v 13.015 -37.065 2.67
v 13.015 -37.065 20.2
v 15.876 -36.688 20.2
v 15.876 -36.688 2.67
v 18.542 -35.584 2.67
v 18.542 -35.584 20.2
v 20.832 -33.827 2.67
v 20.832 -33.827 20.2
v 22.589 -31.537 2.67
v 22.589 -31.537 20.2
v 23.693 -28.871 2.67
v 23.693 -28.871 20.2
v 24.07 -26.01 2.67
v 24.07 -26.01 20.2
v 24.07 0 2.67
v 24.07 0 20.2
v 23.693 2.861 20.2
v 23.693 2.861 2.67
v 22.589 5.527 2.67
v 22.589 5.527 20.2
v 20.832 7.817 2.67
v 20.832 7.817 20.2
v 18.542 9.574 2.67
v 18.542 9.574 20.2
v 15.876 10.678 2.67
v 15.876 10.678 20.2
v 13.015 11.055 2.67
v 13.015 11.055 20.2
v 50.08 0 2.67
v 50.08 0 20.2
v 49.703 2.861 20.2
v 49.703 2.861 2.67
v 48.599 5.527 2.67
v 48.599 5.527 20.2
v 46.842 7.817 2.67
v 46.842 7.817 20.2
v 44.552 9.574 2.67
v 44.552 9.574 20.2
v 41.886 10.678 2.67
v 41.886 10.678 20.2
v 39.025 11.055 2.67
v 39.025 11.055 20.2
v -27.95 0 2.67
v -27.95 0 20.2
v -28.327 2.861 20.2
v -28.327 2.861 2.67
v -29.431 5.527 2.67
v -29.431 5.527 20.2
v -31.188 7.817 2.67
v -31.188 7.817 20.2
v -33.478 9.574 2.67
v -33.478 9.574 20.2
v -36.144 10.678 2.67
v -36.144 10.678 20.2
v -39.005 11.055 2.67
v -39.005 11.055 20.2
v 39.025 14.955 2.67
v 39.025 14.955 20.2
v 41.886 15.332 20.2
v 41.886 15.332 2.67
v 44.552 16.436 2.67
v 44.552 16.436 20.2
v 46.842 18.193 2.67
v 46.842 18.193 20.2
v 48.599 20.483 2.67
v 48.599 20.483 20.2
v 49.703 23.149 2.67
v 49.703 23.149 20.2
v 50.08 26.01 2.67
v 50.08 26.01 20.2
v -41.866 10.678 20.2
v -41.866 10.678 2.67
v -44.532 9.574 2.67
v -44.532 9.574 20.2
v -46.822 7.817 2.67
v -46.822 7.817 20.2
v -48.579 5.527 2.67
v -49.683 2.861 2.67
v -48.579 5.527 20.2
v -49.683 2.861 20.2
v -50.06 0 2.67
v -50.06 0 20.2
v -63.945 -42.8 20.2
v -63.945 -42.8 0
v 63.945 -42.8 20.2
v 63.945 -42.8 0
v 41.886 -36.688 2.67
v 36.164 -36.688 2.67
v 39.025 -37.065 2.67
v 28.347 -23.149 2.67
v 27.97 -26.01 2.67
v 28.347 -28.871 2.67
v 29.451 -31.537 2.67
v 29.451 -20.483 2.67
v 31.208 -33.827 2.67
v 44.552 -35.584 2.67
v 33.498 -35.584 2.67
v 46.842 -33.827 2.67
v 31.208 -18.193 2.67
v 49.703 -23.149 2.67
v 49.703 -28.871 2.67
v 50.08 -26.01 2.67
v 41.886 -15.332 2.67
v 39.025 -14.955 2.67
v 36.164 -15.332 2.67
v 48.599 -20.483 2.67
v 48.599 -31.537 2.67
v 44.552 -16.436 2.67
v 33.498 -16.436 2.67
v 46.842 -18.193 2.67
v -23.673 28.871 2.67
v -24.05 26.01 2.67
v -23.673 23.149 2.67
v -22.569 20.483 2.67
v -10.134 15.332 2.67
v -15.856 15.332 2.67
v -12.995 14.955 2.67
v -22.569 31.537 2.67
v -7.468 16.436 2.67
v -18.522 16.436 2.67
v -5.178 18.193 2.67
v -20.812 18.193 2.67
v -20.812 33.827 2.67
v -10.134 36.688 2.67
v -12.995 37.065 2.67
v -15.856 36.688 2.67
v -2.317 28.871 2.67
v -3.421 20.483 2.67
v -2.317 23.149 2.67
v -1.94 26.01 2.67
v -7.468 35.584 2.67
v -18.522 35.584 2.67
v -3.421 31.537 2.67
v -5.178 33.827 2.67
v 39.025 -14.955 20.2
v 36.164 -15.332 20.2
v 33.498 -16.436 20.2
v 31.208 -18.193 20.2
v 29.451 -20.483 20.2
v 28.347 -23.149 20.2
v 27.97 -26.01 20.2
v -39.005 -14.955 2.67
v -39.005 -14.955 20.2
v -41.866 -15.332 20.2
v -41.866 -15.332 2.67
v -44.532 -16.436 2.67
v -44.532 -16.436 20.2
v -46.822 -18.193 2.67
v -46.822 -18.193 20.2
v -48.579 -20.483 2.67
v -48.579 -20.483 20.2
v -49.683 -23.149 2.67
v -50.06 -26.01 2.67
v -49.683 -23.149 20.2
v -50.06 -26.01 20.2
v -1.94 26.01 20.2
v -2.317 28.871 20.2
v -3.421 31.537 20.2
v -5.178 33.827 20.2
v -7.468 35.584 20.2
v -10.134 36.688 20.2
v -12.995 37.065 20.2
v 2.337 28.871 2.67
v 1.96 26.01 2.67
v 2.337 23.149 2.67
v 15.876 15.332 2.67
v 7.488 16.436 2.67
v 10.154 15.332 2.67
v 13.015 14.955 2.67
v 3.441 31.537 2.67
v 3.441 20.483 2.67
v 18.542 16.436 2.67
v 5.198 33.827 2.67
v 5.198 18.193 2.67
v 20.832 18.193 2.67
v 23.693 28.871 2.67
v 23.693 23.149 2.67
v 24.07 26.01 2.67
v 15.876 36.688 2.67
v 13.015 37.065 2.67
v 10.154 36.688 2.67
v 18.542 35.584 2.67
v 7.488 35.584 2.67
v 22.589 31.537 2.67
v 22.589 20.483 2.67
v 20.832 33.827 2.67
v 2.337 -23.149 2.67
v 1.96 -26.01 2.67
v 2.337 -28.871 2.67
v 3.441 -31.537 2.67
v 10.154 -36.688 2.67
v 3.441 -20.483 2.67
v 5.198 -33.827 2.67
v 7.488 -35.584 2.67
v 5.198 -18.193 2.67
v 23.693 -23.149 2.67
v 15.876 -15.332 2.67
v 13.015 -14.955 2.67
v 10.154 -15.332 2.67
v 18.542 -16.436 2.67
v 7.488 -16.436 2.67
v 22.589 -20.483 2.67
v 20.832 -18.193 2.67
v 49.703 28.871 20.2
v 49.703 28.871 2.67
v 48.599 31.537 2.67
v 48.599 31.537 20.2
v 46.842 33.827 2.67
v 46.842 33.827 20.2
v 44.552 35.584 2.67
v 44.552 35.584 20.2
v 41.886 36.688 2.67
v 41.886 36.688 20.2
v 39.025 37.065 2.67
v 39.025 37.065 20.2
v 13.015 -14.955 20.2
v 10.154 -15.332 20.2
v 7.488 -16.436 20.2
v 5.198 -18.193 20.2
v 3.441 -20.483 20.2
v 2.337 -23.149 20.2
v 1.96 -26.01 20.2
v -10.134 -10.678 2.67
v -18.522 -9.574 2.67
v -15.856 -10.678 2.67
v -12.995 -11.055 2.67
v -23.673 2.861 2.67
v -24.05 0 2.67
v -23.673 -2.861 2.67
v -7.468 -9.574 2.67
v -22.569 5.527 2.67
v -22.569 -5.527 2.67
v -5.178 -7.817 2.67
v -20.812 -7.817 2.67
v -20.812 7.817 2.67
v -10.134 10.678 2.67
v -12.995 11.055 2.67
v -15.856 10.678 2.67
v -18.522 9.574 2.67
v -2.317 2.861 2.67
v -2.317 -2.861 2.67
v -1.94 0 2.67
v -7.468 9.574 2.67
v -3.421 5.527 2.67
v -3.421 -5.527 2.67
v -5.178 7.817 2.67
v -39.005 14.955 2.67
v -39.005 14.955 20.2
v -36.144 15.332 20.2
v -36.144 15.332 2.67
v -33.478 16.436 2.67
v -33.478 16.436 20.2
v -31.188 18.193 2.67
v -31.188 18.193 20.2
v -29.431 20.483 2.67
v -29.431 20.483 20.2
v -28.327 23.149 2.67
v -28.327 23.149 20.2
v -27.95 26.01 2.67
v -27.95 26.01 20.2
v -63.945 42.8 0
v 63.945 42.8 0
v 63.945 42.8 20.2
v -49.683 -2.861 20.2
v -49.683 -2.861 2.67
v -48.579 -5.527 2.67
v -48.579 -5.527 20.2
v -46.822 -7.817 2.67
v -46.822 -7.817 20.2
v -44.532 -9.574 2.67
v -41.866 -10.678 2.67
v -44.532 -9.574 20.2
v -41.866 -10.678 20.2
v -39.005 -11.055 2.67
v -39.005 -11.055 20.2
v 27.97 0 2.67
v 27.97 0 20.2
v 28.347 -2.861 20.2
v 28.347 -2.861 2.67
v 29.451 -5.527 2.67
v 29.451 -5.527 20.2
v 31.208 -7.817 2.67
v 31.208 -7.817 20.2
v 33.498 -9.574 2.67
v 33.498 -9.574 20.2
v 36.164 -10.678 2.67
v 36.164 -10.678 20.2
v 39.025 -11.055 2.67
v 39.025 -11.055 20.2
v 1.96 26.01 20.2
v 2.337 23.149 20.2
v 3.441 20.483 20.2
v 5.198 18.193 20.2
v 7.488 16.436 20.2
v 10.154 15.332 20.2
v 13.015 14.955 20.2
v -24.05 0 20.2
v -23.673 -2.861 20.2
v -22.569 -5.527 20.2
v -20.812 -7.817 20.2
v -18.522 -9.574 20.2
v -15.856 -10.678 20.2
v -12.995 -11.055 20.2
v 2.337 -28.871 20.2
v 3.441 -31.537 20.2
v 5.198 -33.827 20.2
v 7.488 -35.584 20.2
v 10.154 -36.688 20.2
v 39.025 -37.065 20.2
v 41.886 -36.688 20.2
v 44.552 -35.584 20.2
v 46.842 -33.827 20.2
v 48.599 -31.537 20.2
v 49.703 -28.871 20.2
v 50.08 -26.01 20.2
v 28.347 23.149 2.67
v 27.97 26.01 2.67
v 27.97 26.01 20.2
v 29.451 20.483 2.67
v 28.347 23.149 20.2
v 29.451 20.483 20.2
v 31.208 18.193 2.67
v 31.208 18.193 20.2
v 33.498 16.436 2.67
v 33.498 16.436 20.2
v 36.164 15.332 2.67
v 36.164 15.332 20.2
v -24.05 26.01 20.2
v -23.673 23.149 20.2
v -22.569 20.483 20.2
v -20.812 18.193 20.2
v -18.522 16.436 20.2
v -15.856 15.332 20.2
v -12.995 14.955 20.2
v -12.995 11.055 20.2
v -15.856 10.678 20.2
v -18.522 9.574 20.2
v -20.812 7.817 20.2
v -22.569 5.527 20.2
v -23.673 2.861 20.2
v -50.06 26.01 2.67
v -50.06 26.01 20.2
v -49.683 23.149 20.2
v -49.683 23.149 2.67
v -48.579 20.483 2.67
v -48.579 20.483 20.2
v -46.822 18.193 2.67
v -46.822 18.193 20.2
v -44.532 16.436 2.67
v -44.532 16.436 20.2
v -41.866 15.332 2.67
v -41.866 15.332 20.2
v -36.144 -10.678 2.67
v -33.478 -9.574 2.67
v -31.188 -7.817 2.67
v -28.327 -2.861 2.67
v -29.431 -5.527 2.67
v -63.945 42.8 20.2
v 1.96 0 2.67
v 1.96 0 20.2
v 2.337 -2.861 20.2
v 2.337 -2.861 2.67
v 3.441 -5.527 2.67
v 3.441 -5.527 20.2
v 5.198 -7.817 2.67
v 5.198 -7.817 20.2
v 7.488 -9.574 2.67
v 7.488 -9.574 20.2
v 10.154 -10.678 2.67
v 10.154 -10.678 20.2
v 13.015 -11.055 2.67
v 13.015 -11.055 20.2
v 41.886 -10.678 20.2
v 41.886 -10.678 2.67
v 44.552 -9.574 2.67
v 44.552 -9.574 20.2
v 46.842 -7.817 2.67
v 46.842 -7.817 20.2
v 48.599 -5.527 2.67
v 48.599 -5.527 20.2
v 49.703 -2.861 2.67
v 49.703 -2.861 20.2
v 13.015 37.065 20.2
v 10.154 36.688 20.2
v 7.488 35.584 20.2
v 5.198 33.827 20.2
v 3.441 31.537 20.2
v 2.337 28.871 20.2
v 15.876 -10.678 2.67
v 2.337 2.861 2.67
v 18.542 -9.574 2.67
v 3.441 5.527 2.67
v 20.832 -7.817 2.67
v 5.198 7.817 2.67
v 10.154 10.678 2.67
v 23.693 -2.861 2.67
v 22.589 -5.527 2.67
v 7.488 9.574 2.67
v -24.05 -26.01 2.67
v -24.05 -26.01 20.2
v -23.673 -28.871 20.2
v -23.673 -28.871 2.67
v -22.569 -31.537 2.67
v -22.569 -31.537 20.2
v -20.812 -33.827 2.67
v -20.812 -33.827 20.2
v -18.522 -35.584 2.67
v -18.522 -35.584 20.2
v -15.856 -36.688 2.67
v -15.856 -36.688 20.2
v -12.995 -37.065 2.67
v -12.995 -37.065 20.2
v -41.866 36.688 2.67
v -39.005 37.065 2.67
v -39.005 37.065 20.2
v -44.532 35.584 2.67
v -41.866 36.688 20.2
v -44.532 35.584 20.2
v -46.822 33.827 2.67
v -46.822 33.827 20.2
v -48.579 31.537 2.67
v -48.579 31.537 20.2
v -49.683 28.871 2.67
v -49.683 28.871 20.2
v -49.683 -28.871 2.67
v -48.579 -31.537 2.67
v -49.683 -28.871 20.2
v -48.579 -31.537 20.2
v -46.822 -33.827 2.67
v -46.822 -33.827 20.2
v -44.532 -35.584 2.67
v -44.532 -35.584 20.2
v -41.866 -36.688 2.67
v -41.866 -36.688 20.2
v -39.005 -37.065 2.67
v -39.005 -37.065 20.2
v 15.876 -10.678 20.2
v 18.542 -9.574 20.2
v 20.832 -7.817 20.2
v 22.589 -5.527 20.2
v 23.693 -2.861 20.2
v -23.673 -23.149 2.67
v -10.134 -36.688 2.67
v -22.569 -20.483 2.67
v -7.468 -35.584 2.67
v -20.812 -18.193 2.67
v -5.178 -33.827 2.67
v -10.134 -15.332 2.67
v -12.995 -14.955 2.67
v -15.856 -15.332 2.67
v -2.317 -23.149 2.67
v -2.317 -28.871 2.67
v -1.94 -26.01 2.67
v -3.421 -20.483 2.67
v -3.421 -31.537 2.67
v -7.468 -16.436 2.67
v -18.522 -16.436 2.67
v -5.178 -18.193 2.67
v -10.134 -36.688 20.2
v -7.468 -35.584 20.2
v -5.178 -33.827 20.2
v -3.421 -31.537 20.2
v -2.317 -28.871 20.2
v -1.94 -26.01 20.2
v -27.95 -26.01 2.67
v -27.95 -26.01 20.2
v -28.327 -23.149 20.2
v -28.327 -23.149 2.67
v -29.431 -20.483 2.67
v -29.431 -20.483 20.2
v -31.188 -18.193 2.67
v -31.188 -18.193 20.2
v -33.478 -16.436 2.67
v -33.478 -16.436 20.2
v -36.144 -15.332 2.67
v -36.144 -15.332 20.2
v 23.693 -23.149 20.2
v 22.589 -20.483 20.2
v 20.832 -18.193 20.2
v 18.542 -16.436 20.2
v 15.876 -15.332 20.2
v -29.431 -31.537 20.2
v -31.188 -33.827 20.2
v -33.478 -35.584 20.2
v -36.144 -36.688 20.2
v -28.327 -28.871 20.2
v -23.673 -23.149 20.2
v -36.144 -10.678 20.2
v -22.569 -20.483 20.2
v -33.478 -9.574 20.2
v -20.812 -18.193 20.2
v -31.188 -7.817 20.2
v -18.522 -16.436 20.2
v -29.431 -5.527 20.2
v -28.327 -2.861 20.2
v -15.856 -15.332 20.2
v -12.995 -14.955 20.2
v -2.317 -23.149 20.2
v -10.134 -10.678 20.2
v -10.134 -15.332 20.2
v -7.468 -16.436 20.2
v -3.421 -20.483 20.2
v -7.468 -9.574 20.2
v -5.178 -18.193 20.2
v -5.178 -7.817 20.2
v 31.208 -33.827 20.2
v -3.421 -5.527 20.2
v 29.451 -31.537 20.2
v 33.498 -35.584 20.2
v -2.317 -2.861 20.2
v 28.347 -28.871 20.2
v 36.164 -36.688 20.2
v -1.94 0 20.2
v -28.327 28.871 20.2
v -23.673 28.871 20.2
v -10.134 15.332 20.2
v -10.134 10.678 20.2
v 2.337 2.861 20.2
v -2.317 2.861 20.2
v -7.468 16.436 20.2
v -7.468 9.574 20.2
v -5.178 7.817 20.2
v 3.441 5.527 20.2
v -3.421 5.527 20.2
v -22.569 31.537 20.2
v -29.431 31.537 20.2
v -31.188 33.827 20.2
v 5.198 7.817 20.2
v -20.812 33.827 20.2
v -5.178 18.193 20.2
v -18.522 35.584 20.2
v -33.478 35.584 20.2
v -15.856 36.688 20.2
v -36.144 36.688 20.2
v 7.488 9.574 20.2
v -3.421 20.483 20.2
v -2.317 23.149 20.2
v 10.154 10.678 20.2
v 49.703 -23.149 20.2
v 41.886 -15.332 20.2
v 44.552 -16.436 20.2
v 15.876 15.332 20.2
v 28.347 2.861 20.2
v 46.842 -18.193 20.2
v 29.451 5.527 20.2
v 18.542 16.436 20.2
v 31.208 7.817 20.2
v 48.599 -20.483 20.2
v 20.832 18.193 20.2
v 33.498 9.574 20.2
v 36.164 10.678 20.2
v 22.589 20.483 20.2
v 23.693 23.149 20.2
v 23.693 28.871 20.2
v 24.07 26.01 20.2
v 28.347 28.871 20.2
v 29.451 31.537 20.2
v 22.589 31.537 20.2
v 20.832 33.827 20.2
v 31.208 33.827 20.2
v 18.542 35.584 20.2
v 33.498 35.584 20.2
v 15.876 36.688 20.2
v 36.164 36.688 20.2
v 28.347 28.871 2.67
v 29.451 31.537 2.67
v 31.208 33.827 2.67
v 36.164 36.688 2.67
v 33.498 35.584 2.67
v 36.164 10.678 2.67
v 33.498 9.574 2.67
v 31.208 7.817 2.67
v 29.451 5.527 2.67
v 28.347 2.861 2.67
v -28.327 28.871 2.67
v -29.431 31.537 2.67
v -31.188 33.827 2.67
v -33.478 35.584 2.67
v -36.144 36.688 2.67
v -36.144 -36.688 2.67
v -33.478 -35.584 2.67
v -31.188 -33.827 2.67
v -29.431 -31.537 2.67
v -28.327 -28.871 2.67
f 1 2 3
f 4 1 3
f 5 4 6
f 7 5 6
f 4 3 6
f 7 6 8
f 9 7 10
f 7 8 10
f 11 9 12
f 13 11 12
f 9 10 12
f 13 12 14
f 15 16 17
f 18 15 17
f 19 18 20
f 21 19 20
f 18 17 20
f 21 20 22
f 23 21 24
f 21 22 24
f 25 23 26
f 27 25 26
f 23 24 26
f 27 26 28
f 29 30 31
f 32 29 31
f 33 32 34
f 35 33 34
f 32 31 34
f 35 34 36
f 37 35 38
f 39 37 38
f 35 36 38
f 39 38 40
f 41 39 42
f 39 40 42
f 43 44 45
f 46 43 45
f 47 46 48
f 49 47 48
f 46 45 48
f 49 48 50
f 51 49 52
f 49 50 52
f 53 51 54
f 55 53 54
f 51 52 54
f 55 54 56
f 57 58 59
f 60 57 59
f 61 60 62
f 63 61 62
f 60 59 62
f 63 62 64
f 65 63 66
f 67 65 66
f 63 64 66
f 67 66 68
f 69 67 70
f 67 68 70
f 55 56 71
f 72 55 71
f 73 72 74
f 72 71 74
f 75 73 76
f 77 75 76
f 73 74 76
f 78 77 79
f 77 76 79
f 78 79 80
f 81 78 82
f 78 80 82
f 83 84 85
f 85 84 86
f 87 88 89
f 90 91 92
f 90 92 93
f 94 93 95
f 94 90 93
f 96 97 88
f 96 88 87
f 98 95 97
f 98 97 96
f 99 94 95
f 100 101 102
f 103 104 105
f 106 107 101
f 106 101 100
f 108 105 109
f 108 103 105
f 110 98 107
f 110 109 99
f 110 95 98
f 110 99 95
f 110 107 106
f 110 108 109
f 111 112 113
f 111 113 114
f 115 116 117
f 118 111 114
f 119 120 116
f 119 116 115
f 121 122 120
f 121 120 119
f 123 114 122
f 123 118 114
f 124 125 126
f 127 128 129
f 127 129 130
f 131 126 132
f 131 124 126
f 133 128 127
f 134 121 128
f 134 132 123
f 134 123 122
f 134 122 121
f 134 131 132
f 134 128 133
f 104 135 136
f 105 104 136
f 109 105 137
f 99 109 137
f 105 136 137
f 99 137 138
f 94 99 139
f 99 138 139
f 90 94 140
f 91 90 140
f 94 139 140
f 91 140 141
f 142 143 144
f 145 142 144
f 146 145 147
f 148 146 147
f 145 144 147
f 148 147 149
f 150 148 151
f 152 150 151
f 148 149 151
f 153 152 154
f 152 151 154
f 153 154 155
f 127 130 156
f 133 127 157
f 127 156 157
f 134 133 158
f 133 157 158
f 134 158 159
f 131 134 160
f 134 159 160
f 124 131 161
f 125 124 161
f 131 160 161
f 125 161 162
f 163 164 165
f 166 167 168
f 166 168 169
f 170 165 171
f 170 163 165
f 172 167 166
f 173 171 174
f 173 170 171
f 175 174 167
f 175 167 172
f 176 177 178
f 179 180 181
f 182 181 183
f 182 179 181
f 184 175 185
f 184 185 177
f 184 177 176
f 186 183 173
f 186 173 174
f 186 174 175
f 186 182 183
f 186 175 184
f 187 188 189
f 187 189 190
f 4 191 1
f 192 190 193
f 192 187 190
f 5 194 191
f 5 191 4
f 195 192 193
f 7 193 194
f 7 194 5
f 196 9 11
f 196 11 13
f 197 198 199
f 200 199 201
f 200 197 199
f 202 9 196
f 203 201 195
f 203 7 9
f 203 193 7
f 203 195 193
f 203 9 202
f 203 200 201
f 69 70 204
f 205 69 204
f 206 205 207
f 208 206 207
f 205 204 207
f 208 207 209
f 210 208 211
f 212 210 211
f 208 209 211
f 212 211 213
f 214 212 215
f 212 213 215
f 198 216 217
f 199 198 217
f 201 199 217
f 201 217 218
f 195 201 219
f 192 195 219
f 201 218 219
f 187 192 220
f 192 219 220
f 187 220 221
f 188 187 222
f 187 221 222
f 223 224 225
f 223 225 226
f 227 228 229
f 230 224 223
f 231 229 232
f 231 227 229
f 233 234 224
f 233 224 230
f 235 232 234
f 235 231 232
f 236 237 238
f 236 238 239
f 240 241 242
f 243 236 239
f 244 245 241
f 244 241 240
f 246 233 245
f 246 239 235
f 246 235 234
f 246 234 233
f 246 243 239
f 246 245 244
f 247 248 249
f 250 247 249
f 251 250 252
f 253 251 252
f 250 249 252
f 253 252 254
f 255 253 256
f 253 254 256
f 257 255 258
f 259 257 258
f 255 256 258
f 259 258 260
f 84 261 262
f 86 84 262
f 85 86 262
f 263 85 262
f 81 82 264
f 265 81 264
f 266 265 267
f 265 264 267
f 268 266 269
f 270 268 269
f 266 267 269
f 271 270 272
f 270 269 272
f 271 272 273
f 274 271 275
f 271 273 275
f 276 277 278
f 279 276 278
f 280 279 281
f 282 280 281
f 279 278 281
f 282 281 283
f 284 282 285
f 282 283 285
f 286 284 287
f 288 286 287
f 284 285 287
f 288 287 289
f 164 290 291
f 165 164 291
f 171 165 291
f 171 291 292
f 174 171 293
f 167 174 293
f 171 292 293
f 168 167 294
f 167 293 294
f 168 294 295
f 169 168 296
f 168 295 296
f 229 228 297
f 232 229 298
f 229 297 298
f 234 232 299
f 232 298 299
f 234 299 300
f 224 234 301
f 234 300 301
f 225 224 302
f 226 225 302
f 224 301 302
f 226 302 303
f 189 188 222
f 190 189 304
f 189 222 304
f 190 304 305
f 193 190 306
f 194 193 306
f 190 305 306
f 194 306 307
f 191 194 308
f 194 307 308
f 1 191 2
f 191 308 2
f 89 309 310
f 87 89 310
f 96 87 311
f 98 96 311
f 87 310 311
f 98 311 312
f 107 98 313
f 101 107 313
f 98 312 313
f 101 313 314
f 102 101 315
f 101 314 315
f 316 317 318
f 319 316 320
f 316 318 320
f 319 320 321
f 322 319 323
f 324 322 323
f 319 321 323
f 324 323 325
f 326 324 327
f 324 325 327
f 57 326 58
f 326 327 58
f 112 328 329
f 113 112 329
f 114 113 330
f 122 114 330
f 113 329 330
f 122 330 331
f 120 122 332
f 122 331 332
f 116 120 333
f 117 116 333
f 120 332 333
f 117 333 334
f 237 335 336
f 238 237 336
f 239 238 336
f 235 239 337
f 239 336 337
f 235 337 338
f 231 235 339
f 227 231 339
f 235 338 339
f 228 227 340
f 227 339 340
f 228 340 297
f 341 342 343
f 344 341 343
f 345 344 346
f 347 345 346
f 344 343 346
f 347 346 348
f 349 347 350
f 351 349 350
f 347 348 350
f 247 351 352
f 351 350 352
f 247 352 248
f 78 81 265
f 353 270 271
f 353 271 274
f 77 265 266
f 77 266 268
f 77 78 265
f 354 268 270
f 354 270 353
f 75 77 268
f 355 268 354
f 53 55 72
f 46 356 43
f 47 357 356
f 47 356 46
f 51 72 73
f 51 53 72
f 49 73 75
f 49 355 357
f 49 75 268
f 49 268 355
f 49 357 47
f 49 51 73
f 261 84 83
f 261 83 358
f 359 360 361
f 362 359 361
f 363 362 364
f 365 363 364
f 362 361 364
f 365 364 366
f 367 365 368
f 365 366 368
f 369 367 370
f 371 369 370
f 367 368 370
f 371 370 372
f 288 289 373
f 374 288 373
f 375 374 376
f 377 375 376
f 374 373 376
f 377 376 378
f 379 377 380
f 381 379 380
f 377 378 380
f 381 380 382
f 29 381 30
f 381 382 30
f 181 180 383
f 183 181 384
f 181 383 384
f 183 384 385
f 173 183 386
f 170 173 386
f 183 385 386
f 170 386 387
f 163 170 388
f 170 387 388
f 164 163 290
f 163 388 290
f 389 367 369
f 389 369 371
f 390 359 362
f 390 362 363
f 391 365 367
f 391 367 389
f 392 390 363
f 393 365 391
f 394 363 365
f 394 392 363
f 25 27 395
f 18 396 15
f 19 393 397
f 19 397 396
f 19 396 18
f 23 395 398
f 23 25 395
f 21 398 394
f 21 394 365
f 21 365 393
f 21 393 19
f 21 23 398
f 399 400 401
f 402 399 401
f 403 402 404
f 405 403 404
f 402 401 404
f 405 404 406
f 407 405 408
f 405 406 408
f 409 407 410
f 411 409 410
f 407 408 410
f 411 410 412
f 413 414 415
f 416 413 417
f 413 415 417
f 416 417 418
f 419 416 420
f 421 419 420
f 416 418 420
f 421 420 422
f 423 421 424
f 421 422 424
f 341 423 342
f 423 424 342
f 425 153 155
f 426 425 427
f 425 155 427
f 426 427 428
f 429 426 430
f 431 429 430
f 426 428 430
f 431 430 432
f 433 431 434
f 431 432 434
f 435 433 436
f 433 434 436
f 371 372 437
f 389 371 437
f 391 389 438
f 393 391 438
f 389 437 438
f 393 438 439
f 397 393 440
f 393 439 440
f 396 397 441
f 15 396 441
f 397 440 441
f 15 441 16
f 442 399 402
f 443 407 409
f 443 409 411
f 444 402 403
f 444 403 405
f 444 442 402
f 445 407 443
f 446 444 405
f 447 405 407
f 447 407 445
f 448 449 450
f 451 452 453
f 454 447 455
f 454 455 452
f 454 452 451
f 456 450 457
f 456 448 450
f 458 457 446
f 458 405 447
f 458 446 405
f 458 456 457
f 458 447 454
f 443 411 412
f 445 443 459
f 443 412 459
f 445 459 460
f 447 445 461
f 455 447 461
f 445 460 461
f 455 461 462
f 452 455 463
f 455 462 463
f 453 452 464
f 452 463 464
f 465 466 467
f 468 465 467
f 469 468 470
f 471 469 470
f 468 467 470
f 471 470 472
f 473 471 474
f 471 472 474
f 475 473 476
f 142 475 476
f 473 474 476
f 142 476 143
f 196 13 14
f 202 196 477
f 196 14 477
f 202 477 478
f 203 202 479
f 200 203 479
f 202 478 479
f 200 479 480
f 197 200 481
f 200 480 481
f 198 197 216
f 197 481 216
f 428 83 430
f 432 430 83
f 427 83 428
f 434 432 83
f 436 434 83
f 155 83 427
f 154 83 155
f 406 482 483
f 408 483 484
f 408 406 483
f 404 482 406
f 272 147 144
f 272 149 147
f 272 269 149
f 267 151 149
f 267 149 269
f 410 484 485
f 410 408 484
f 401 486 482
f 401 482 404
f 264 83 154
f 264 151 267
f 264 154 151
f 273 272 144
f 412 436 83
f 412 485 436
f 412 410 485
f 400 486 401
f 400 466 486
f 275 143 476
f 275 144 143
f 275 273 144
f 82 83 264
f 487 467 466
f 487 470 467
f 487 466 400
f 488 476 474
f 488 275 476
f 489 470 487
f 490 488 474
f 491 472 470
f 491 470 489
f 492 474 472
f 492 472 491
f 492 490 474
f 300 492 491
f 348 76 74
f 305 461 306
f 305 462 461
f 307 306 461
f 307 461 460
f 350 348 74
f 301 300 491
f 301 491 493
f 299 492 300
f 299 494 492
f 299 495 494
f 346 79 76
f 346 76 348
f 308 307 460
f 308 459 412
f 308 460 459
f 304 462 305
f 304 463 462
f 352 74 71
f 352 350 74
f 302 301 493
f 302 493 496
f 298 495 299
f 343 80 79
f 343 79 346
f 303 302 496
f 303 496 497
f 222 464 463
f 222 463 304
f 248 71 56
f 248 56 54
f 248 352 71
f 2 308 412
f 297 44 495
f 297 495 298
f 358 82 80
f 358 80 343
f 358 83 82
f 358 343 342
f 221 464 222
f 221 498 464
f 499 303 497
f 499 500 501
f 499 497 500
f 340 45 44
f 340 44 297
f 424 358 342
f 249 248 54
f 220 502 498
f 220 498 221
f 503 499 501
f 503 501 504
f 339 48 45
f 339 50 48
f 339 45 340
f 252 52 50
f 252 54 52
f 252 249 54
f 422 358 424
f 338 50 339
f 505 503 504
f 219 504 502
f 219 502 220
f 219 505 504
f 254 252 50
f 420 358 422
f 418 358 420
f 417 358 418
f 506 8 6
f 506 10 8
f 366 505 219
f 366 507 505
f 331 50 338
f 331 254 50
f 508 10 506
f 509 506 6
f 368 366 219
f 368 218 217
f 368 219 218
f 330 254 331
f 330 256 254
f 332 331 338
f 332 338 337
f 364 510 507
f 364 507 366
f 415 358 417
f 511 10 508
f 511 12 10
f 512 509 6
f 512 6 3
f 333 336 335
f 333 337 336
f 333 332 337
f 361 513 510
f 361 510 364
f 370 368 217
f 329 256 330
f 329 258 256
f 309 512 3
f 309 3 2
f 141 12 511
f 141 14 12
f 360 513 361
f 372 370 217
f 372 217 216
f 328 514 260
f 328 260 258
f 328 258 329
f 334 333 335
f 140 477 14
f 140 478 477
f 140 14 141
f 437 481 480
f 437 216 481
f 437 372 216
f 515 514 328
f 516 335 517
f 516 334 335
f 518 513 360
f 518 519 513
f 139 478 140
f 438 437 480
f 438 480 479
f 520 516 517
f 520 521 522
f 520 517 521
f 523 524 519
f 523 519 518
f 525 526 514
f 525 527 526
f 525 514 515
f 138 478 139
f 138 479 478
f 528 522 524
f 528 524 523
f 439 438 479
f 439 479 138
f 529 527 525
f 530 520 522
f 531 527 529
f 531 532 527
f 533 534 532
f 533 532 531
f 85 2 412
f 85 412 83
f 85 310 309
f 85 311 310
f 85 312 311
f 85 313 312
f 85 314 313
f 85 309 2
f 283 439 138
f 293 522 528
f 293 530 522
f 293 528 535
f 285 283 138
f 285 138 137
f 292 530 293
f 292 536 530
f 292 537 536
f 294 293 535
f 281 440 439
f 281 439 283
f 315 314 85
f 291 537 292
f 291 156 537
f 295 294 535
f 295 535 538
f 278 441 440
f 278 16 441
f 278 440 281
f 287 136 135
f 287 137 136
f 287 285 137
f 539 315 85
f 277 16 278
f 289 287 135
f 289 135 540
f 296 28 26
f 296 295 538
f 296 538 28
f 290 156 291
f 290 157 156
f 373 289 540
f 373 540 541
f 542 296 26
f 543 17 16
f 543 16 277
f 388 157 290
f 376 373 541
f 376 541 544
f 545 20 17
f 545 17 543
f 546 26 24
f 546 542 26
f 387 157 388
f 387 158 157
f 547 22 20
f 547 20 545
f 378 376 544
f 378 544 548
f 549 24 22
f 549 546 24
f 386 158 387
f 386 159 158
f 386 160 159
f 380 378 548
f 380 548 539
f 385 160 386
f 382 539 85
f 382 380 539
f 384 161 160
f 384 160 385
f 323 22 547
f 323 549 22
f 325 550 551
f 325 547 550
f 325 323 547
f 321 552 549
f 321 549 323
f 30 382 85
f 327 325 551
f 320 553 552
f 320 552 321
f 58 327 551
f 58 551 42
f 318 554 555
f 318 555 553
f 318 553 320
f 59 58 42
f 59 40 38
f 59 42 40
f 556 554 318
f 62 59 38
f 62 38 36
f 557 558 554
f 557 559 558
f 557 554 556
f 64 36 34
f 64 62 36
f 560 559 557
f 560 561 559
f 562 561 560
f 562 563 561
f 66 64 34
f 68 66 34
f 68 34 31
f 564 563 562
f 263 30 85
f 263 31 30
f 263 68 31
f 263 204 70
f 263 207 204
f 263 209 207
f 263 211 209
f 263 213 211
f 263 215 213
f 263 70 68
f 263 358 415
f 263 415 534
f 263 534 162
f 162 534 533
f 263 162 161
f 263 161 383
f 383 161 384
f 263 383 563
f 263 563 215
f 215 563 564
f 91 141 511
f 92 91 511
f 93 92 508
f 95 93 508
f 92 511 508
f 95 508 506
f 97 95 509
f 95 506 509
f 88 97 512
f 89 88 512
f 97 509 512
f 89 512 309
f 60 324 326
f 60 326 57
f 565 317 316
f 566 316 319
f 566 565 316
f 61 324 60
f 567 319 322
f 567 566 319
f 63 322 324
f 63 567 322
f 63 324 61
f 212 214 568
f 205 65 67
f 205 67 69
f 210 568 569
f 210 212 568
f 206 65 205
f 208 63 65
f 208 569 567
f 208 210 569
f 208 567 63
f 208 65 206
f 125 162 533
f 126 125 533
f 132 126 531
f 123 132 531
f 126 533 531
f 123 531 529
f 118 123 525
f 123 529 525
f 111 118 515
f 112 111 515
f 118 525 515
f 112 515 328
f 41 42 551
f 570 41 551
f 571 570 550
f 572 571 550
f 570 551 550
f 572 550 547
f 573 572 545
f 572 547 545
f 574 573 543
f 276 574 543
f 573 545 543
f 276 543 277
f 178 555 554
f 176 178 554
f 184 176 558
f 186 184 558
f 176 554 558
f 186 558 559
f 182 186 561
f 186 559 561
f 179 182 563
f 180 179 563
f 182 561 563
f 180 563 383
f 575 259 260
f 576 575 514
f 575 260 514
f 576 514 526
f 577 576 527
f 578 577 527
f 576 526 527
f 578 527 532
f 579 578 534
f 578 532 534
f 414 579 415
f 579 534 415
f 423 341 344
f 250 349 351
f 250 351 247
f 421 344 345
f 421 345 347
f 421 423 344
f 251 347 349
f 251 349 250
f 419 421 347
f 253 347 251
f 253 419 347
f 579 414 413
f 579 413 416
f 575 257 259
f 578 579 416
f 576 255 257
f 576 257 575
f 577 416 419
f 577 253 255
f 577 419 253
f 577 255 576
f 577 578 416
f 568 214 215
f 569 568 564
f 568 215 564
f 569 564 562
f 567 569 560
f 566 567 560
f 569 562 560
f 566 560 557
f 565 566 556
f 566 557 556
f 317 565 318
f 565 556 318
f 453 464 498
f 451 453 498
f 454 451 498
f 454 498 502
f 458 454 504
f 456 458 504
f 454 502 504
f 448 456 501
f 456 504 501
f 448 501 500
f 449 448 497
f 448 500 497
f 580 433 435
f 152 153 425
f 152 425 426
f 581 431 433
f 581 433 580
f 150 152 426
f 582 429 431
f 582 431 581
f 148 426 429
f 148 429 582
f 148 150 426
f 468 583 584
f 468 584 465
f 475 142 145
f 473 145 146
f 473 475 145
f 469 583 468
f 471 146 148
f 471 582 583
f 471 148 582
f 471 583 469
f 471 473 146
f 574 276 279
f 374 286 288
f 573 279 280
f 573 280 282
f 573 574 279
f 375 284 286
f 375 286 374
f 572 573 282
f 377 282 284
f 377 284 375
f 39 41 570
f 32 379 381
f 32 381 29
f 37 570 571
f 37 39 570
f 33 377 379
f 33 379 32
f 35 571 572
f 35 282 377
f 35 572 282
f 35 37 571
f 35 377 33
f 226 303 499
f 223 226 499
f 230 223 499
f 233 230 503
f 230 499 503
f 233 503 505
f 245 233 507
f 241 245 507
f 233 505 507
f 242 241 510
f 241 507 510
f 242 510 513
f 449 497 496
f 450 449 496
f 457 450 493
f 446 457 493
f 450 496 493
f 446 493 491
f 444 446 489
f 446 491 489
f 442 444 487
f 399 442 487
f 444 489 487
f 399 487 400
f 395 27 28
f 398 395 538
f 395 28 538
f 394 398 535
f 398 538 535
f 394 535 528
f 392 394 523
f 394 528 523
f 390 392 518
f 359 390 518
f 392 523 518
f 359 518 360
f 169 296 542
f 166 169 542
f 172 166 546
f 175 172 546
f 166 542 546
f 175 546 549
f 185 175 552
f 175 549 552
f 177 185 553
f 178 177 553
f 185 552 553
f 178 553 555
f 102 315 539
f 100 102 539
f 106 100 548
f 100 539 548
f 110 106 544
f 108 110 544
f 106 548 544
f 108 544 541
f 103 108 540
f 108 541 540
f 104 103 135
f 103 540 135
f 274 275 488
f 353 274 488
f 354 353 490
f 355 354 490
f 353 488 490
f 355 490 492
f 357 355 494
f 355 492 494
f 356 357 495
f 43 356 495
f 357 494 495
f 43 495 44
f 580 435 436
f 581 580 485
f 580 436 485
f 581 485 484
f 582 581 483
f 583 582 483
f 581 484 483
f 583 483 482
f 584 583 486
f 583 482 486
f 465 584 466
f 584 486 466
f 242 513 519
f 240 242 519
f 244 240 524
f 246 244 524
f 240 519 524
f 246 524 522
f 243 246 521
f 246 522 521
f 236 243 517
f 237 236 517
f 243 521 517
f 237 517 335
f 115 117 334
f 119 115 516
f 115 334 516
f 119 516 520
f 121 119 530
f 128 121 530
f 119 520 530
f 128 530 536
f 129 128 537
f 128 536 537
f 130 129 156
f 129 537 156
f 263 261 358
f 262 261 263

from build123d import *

# Parameters (mm, degrees)
F0_W     = 127.89
F0_H     = 85.6
F1_DEPTH = 20.2
F3_DEPTH = 17.53


with BuildPart() as f1:
    # F0 (on Top) → F1 (new body)
    with BuildSketch(Plane.XY):
        Rectangle(F0_W, F0_H)
    extrude(amount=F1_DEPTH)

    # F2 (on face) → F3 (cut)
    with BuildSketch(Plane.XY.offset(20.2)):
        with BuildLine():
            Line((-39.005, 26.01), (-39.005, 37.065))
            ThreePointArc((-39.005, 37.065), (-46.822065466, 33.827065466), (-50.06, 26.01))
            Line((-50.06, 26.01), (-39.005, 26.01))
        make_face()
        with BuildLine():
            ThreePointArc((-27.95, 26.01), (-31.187934534, 33.827065466), (-39.005, 37.065))
            Line((-39.005, 37.065), (-39.005, 26.01))
            Line((-39.005, 26.01), (-27.95, 26.01))
        make_face()
        with BuildLine():
            Line((-27.95, 26.01), (-39.005, 26.01))
            Line((-39.005, 26.01), (-39.005, 14.955))
            ThreePointArc((-39.005, 14.955), (-31.187934534, 18.192934534), (-27.95, 26.01))
        make_face()
        with BuildLine():
            Line((-39.005, 14.955), (-39.005, 26.01))
            Line((-39.005, 26.01), (-50.06, 26.01))
            ThreePointArc((-50.06, 26.01), (-46.822065466, 18.192934534), (-39.005, 14.955))
        make_face()
        with BuildLine():
            ThreePointArc((-39.005, 11.055), (-46.822065466, 7.817065466), (-50.06, 0))
            Line((-50.06, 0), (-39.005, 0))
            Line((-39.005, 0), (-39.005, 11.055))
        make_face()
        with BuildLine():
            ThreePointArc((-27.95, 0), (-31.187934534, 7.817065466), (-39.005, 11.055))
            Line((-39.005, 11.055), (-39.005, 0))
            Line((-39.005, 0), (-27.95, 0))
        make_face()
        with BuildLine():
            Line((-39.005, 0), (-50.06, 0))
            ThreePointArc((-50.06, 0), (-46.822065466, -7.817065466), (-39.005, -11.055))
            Line((-39.005, -11.055), (-39.005, 0))
        make_face()
        with BuildLine():
            Line((-27.95, 0), (-39.005, 0))
            Line((-39.005, 0), (-39.005, -11.055))
            ThreePointArc((-39.005, -11.055), (-31.187934534, -7.817065466), (-27.95, 0))
        make_face()
        with BuildLine():
            Line((-39.005, -14.955), (-39.005, -26.01))
            Line((-39.005, -26.01), (-27.95, -26.01))
            ThreePointArc((-27.95, -26.01), (-31.187934534, -18.192934534), (-39.005, -14.955))
        make_face()
        with BuildLine():
            ThreePointArc((-39.005, -14.955), (-46.822065466, -18.192934534), (-50.06, -26.01))
            Line((-50.06, -26.01), (-39.005, -26.01))
            Line((-39.005, -26.01), (-39.005, -14.955))
        make_face()
        with BuildLine():
            Line((-39.005, -26.01), (-50.06, -26.01))
            ThreePointArc((-50.06, -26.01), (-46.822065466, -33.827065466), (-39.005, -37.065))
            Line((-39.005, -37.065), (-39.005, -26.01))
        make_face()
        with BuildLine():
            Line((-39.005, -26.01), (-39.005, -37.065))
            ThreePointArc((-39.005, -37.065), (-31.187934534, -33.827065466), (-27.95, -26.01))
            Line((-27.95, -26.01), (-39.005, -26.01))
        make_face()
        with BuildLine():
            ThreePointArc((-24.05, -26.01), (-20.812065466, -33.827065466), (-12.995, -37.065))
            Line((-12.995, -37.065), (-12.995, -26.01))
            Line((-12.995, -26.01), (-24.05, -26.01))
        make_face()
        with BuildLine():
            Line((-12.995, -26.01), (-12.995, -37.065))
            ThreePointArc((-12.995, -37.065), (-5.177934534, -33.827065466), (-1.94, -26.01))
            Line((-1.94, -26.01), (-12.995, -26.01))
        make_face()
        with BuildLine():
            Line((-12.995, -14.955), (-12.995, -26.01))
            Line((-12.995, -26.01), (-1.94, -26.01))
            ThreePointArc((-1.94, -26.01), (-5.177934534, -18.192934534), (-12.995, -14.955))
        make_face()
        with BuildLine():
            Line((-24.05, -26.01), (-12.995, -26.01))
            Line((-12.995, -26.01), (-12.995, -14.955))
            ThreePointArc((-12.995, -14.955), (-20.812065466, -18.192934534), (-24.05, -26.01))
        make_face()
        with BuildLine():
            Line((-12.995, -11.055), (-12.995, 0))
            Line((-12.995, 0), (-24.05, 0))
            ThreePointArc((-24.05, 0), (-20.812065466, -7.817065466), (-12.995, -11.055))
        make_face()
        with BuildLine():
            Line((-1.94, 0), (-12.995, 0))
            Line((-12.995, 0), (-12.995, -11.055))
            ThreePointArc((-12.995, -11.055), (-5.177934534, -7.817065466), (-1.94, 0))
        make_face()
        with BuildLine():
            ThreePointArc((-1.94, 0), (-5.177934534, 7.817065466), (-12.995, 11.055))
            Line((-12.995, 11.055), (-12.995, 0))
            Line((-12.995, 0), (-1.94, 0))
        make_face()
        with BuildLine():
            Line((-12.995, 0), (-12.995, 11.055))
            ThreePointArc((-12.995, 11.055), (-20.812065466, 7.817065466), (-24.05, 0))
            Line((-24.05, 0), (-12.995, 0))
        make_face()
        with BuildLine():
            Line((-12.995, 14.955), (-12.995, 26.01))
            Line((-12.995, 26.01), (-24.05, 26.01))
            ThreePointArc((-24.05, 26.01), (-20.812065466, 18.192934534), (-12.995, 14.955))
        make_face()
        with BuildLine():
            Line((-1.94, 26.01), (-12.995, 26.01))
            Line((-12.995, 26.01), (-12.995, 14.955))
            ThreePointArc((-12.995, 14.955), (-5.177934534, 18.192934534), (-1.94, 26.01))
        make_face()
        with BuildLine():
            ThreePointArc((-1.94, 26.01), (-5.177934534, 33.827065466), (-12.995, 37.065))
            Line((-12.995, 37.065), (-12.995, 26.01))
            Line((-12.995, 26.01), (-1.94, 26.01))
        make_face()
        with BuildLine():
            Line((-12.995, 26.01), (-12.995, 37.065))
            ThreePointArc((-12.995, 37.065), (-20.812065466, 33.827065466), (-24.05, 26.01))
            Line((-24.05, 26.01), (-12.995, 26.01))
        make_face()
        with BuildLine():
            Line((13.015, 26.01), (13.015, 37.065))
            ThreePointArc((13.015, 37.065), (5.197934534, 33.827065466), (1.96, 26.01))
            Line((1.96, 26.01), (13.015, 26.01))
        make_face()
        with BuildLine():
            ThreePointArc((24.07, 26.01), (20.832065466, 33.827065466), (13.015, 37.065))
            Line((13.015, 37.065), (13.015, 26.01))
            Line((13.015, 26.01), (24.07, 26.01))
        make_face()
        with BuildLine():
            Line((24.07, 26.01), (13.015, 26.01))
            Line((13.015, 26.01), (13.015, 14.955))
            ThreePointArc((13.015, 14.955), (20.832065466, 18.192934534), (24.07, 26.01))
        make_face()
        with BuildLine():
            Line((13.015, 14.955), (13.015, 26.01))
            Line((13.015, 26.01), (1.96, 26.01))
            ThreePointArc((1.96, 26.01), (5.197934534, 18.192934534), (13.015, 14.955))
        make_face()
        with BuildLine():
            Line((13.015, 0), (13.015, 11.055))
            ThreePointArc((13.015, 11.055), (5.197934534, 7.817065466), (1.96, 0))
            Line((1.96, 0), (13.015, 0))
        make_face()
        with BuildLine():
            ThreePointArc((24.07, 0), (20.832065466, 7.817065466), (13.015, 11.055))
            Line((13.015, 11.055), (13.015, 0))
            Line((13.015, 0), (24.07, 0))
        make_face()
        with BuildLine():
            Line((13.015, -11.055), (13.015, 0))
            Line((13.015, 0), (1.96, 0))
            ThreePointArc((1.96, 0), (5.197934534, -7.817065466), (13.015, -11.055))
        make_face()
        with BuildLine():
            ThreePointArc((13.015, -11.055), (20.832065466, -7.817065466), (24.07, 0))
            Line((24.07, 0), (13.015, 0))
            Line((13.015, 0), (13.015, -11.055))
        make_face()
        with BuildLine():
            Line((39.025, -11.055), (39.025, 0))
            Line((39.025, 0), (27.97, 0))
            ThreePointArc((27.97, 0), (31.207934534, -7.817065466), (39.025, -11.055))
        make_face()
        with BuildLine():
            ThreePointArc((39.025, -11.055), (46.842065466, -7.817065466), (50.08, 0))
            Line((50.08, 0), (39.025, 0))
            Line((39.025, 0), (39.025, -11.055))
        make_face()
        with BuildLine():
            Line((39.025, 0), (50.08, 0))
            ThreePointArc((50.08, 0), (46.842065466, 7.817065466), (39.025, 11.055))
            Line((39.025, 11.055), (39.025, 0))
        make_face()
        with BuildLine():
            Line((27.97, 0), (39.025, 0))
            Line((39.025, 0), (39.025, 11.055))
            ThreePointArc((39.025, 11.055), (31.207934534, 7.817065466), (27.97, 0))
        make_face()
        with BuildLine():
            Line((39.025, 14.955), (39.025, 26.01))
            Line((39.025, 26.01), (27.97, 26.01))
            ThreePointArc((27.97, 26.01), (31.207934534, 18.192934534), (39.025, 14.955))
        make_face()
        with BuildLine():
            ThreePointArc((39.025, 14.955), (46.842065466, 18.192934534), (50.08, 26.01))
            Line((50.08, 26.01), (39.025, 26.01))
            Line((39.025, 26.01), (39.025, 14.955))
        make_face()
        with BuildLine():
            ThreePointArc((50.08, 26.01), (46.842065466, 33.827065466), (39.025, 37.065))
            Line((39.025, 37.065), (39.025, 26.01))
            Line((39.025, 26.01), (50.08, 26.01))
        make_face()
        with BuildLine():
            Line((39.025, 26.01), (39.025, 37.065))
            ThreePointArc((39.025, 37.065), (31.207934534, 33.827065466), (27.97, 26.01))
            Line((27.97, 26.01), (39.025, 26.01))
        make_face()
        with BuildLine():
            Line((13.015, -26.01), (24.07, -26.01))
            ThreePointArc((24.07, -26.01), (20.832065466, -18.192934534), (13.015, -14.955))
            Line((13.015, -14.955), (13.015, -26.01))
        make_face()
        with BuildLine():
            Line((1.96, -26.01), (13.015, -26.01))
            Line((13.015, -26.01), (13.015, -14.955))
            ThreePointArc((13.015, -14.955), (5.197934534, -18.192934534), (1.96, -26.01))
        make_face()
        with BuildLine():
            ThreePointArc((1.96, -26.01), (5.197934534, -33.827065466), (13.015, -37.065))
            Line((13.015, -37.065), (13.015, -26.01))
            Line((13.015, -26.01), (1.96, -26.01))
        make_face()
        with BuildLine():
            Line((13.015, -26.01), (13.015, -37.065))
            ThreePointArc((13.015, -37.065), (20.832065466, -33.827065466), (24.07, -26.01))
            Line((24.07, -26.01), (13.015, -26.01))
        make_face()
        with BuildLine():
            Line((27.97, -26.01), (39.025, -26.01))
            Line((39.025, -26.01), (39.025, -14.955))
            ThreePointArc((39.025, -14.955), (31.207934534, -18.192934534), (27.97, -26.01))
        make_face()
        with BuildLine():
            Line((39.025, -26.01), (50.08, -26.01))
            ThreePointArc((50.08, -26.01), (46.842065466, -18.192934534), (39.025, -14.955))
            Line((39.025, -14.955), (39.025, -26.01))
        make_face()
        with BuildLine():
            ThreePointArc((39.025, -37.065), (46.842065466, -33.827065466), (50.08, -26.01))
            Line((50.08, -26.01), (39.025, -26.01))
            Line((39.025, -26.01), (39.025, -37.065))
        make_face()
        with BuildLine():
            Line((39.025, -37.065), (39.025, -26.01))
            Line((39.025, -26.01), (27.97, -26.01))
            ThreePointArc((27.97, -26.01), (31.207934534, -33.827065466), (39.025, -37.065))
        make_face()
    extrude(amount=-F3_DEPTH, mode=Mode.SUBTRACT)


solid = f1.part
